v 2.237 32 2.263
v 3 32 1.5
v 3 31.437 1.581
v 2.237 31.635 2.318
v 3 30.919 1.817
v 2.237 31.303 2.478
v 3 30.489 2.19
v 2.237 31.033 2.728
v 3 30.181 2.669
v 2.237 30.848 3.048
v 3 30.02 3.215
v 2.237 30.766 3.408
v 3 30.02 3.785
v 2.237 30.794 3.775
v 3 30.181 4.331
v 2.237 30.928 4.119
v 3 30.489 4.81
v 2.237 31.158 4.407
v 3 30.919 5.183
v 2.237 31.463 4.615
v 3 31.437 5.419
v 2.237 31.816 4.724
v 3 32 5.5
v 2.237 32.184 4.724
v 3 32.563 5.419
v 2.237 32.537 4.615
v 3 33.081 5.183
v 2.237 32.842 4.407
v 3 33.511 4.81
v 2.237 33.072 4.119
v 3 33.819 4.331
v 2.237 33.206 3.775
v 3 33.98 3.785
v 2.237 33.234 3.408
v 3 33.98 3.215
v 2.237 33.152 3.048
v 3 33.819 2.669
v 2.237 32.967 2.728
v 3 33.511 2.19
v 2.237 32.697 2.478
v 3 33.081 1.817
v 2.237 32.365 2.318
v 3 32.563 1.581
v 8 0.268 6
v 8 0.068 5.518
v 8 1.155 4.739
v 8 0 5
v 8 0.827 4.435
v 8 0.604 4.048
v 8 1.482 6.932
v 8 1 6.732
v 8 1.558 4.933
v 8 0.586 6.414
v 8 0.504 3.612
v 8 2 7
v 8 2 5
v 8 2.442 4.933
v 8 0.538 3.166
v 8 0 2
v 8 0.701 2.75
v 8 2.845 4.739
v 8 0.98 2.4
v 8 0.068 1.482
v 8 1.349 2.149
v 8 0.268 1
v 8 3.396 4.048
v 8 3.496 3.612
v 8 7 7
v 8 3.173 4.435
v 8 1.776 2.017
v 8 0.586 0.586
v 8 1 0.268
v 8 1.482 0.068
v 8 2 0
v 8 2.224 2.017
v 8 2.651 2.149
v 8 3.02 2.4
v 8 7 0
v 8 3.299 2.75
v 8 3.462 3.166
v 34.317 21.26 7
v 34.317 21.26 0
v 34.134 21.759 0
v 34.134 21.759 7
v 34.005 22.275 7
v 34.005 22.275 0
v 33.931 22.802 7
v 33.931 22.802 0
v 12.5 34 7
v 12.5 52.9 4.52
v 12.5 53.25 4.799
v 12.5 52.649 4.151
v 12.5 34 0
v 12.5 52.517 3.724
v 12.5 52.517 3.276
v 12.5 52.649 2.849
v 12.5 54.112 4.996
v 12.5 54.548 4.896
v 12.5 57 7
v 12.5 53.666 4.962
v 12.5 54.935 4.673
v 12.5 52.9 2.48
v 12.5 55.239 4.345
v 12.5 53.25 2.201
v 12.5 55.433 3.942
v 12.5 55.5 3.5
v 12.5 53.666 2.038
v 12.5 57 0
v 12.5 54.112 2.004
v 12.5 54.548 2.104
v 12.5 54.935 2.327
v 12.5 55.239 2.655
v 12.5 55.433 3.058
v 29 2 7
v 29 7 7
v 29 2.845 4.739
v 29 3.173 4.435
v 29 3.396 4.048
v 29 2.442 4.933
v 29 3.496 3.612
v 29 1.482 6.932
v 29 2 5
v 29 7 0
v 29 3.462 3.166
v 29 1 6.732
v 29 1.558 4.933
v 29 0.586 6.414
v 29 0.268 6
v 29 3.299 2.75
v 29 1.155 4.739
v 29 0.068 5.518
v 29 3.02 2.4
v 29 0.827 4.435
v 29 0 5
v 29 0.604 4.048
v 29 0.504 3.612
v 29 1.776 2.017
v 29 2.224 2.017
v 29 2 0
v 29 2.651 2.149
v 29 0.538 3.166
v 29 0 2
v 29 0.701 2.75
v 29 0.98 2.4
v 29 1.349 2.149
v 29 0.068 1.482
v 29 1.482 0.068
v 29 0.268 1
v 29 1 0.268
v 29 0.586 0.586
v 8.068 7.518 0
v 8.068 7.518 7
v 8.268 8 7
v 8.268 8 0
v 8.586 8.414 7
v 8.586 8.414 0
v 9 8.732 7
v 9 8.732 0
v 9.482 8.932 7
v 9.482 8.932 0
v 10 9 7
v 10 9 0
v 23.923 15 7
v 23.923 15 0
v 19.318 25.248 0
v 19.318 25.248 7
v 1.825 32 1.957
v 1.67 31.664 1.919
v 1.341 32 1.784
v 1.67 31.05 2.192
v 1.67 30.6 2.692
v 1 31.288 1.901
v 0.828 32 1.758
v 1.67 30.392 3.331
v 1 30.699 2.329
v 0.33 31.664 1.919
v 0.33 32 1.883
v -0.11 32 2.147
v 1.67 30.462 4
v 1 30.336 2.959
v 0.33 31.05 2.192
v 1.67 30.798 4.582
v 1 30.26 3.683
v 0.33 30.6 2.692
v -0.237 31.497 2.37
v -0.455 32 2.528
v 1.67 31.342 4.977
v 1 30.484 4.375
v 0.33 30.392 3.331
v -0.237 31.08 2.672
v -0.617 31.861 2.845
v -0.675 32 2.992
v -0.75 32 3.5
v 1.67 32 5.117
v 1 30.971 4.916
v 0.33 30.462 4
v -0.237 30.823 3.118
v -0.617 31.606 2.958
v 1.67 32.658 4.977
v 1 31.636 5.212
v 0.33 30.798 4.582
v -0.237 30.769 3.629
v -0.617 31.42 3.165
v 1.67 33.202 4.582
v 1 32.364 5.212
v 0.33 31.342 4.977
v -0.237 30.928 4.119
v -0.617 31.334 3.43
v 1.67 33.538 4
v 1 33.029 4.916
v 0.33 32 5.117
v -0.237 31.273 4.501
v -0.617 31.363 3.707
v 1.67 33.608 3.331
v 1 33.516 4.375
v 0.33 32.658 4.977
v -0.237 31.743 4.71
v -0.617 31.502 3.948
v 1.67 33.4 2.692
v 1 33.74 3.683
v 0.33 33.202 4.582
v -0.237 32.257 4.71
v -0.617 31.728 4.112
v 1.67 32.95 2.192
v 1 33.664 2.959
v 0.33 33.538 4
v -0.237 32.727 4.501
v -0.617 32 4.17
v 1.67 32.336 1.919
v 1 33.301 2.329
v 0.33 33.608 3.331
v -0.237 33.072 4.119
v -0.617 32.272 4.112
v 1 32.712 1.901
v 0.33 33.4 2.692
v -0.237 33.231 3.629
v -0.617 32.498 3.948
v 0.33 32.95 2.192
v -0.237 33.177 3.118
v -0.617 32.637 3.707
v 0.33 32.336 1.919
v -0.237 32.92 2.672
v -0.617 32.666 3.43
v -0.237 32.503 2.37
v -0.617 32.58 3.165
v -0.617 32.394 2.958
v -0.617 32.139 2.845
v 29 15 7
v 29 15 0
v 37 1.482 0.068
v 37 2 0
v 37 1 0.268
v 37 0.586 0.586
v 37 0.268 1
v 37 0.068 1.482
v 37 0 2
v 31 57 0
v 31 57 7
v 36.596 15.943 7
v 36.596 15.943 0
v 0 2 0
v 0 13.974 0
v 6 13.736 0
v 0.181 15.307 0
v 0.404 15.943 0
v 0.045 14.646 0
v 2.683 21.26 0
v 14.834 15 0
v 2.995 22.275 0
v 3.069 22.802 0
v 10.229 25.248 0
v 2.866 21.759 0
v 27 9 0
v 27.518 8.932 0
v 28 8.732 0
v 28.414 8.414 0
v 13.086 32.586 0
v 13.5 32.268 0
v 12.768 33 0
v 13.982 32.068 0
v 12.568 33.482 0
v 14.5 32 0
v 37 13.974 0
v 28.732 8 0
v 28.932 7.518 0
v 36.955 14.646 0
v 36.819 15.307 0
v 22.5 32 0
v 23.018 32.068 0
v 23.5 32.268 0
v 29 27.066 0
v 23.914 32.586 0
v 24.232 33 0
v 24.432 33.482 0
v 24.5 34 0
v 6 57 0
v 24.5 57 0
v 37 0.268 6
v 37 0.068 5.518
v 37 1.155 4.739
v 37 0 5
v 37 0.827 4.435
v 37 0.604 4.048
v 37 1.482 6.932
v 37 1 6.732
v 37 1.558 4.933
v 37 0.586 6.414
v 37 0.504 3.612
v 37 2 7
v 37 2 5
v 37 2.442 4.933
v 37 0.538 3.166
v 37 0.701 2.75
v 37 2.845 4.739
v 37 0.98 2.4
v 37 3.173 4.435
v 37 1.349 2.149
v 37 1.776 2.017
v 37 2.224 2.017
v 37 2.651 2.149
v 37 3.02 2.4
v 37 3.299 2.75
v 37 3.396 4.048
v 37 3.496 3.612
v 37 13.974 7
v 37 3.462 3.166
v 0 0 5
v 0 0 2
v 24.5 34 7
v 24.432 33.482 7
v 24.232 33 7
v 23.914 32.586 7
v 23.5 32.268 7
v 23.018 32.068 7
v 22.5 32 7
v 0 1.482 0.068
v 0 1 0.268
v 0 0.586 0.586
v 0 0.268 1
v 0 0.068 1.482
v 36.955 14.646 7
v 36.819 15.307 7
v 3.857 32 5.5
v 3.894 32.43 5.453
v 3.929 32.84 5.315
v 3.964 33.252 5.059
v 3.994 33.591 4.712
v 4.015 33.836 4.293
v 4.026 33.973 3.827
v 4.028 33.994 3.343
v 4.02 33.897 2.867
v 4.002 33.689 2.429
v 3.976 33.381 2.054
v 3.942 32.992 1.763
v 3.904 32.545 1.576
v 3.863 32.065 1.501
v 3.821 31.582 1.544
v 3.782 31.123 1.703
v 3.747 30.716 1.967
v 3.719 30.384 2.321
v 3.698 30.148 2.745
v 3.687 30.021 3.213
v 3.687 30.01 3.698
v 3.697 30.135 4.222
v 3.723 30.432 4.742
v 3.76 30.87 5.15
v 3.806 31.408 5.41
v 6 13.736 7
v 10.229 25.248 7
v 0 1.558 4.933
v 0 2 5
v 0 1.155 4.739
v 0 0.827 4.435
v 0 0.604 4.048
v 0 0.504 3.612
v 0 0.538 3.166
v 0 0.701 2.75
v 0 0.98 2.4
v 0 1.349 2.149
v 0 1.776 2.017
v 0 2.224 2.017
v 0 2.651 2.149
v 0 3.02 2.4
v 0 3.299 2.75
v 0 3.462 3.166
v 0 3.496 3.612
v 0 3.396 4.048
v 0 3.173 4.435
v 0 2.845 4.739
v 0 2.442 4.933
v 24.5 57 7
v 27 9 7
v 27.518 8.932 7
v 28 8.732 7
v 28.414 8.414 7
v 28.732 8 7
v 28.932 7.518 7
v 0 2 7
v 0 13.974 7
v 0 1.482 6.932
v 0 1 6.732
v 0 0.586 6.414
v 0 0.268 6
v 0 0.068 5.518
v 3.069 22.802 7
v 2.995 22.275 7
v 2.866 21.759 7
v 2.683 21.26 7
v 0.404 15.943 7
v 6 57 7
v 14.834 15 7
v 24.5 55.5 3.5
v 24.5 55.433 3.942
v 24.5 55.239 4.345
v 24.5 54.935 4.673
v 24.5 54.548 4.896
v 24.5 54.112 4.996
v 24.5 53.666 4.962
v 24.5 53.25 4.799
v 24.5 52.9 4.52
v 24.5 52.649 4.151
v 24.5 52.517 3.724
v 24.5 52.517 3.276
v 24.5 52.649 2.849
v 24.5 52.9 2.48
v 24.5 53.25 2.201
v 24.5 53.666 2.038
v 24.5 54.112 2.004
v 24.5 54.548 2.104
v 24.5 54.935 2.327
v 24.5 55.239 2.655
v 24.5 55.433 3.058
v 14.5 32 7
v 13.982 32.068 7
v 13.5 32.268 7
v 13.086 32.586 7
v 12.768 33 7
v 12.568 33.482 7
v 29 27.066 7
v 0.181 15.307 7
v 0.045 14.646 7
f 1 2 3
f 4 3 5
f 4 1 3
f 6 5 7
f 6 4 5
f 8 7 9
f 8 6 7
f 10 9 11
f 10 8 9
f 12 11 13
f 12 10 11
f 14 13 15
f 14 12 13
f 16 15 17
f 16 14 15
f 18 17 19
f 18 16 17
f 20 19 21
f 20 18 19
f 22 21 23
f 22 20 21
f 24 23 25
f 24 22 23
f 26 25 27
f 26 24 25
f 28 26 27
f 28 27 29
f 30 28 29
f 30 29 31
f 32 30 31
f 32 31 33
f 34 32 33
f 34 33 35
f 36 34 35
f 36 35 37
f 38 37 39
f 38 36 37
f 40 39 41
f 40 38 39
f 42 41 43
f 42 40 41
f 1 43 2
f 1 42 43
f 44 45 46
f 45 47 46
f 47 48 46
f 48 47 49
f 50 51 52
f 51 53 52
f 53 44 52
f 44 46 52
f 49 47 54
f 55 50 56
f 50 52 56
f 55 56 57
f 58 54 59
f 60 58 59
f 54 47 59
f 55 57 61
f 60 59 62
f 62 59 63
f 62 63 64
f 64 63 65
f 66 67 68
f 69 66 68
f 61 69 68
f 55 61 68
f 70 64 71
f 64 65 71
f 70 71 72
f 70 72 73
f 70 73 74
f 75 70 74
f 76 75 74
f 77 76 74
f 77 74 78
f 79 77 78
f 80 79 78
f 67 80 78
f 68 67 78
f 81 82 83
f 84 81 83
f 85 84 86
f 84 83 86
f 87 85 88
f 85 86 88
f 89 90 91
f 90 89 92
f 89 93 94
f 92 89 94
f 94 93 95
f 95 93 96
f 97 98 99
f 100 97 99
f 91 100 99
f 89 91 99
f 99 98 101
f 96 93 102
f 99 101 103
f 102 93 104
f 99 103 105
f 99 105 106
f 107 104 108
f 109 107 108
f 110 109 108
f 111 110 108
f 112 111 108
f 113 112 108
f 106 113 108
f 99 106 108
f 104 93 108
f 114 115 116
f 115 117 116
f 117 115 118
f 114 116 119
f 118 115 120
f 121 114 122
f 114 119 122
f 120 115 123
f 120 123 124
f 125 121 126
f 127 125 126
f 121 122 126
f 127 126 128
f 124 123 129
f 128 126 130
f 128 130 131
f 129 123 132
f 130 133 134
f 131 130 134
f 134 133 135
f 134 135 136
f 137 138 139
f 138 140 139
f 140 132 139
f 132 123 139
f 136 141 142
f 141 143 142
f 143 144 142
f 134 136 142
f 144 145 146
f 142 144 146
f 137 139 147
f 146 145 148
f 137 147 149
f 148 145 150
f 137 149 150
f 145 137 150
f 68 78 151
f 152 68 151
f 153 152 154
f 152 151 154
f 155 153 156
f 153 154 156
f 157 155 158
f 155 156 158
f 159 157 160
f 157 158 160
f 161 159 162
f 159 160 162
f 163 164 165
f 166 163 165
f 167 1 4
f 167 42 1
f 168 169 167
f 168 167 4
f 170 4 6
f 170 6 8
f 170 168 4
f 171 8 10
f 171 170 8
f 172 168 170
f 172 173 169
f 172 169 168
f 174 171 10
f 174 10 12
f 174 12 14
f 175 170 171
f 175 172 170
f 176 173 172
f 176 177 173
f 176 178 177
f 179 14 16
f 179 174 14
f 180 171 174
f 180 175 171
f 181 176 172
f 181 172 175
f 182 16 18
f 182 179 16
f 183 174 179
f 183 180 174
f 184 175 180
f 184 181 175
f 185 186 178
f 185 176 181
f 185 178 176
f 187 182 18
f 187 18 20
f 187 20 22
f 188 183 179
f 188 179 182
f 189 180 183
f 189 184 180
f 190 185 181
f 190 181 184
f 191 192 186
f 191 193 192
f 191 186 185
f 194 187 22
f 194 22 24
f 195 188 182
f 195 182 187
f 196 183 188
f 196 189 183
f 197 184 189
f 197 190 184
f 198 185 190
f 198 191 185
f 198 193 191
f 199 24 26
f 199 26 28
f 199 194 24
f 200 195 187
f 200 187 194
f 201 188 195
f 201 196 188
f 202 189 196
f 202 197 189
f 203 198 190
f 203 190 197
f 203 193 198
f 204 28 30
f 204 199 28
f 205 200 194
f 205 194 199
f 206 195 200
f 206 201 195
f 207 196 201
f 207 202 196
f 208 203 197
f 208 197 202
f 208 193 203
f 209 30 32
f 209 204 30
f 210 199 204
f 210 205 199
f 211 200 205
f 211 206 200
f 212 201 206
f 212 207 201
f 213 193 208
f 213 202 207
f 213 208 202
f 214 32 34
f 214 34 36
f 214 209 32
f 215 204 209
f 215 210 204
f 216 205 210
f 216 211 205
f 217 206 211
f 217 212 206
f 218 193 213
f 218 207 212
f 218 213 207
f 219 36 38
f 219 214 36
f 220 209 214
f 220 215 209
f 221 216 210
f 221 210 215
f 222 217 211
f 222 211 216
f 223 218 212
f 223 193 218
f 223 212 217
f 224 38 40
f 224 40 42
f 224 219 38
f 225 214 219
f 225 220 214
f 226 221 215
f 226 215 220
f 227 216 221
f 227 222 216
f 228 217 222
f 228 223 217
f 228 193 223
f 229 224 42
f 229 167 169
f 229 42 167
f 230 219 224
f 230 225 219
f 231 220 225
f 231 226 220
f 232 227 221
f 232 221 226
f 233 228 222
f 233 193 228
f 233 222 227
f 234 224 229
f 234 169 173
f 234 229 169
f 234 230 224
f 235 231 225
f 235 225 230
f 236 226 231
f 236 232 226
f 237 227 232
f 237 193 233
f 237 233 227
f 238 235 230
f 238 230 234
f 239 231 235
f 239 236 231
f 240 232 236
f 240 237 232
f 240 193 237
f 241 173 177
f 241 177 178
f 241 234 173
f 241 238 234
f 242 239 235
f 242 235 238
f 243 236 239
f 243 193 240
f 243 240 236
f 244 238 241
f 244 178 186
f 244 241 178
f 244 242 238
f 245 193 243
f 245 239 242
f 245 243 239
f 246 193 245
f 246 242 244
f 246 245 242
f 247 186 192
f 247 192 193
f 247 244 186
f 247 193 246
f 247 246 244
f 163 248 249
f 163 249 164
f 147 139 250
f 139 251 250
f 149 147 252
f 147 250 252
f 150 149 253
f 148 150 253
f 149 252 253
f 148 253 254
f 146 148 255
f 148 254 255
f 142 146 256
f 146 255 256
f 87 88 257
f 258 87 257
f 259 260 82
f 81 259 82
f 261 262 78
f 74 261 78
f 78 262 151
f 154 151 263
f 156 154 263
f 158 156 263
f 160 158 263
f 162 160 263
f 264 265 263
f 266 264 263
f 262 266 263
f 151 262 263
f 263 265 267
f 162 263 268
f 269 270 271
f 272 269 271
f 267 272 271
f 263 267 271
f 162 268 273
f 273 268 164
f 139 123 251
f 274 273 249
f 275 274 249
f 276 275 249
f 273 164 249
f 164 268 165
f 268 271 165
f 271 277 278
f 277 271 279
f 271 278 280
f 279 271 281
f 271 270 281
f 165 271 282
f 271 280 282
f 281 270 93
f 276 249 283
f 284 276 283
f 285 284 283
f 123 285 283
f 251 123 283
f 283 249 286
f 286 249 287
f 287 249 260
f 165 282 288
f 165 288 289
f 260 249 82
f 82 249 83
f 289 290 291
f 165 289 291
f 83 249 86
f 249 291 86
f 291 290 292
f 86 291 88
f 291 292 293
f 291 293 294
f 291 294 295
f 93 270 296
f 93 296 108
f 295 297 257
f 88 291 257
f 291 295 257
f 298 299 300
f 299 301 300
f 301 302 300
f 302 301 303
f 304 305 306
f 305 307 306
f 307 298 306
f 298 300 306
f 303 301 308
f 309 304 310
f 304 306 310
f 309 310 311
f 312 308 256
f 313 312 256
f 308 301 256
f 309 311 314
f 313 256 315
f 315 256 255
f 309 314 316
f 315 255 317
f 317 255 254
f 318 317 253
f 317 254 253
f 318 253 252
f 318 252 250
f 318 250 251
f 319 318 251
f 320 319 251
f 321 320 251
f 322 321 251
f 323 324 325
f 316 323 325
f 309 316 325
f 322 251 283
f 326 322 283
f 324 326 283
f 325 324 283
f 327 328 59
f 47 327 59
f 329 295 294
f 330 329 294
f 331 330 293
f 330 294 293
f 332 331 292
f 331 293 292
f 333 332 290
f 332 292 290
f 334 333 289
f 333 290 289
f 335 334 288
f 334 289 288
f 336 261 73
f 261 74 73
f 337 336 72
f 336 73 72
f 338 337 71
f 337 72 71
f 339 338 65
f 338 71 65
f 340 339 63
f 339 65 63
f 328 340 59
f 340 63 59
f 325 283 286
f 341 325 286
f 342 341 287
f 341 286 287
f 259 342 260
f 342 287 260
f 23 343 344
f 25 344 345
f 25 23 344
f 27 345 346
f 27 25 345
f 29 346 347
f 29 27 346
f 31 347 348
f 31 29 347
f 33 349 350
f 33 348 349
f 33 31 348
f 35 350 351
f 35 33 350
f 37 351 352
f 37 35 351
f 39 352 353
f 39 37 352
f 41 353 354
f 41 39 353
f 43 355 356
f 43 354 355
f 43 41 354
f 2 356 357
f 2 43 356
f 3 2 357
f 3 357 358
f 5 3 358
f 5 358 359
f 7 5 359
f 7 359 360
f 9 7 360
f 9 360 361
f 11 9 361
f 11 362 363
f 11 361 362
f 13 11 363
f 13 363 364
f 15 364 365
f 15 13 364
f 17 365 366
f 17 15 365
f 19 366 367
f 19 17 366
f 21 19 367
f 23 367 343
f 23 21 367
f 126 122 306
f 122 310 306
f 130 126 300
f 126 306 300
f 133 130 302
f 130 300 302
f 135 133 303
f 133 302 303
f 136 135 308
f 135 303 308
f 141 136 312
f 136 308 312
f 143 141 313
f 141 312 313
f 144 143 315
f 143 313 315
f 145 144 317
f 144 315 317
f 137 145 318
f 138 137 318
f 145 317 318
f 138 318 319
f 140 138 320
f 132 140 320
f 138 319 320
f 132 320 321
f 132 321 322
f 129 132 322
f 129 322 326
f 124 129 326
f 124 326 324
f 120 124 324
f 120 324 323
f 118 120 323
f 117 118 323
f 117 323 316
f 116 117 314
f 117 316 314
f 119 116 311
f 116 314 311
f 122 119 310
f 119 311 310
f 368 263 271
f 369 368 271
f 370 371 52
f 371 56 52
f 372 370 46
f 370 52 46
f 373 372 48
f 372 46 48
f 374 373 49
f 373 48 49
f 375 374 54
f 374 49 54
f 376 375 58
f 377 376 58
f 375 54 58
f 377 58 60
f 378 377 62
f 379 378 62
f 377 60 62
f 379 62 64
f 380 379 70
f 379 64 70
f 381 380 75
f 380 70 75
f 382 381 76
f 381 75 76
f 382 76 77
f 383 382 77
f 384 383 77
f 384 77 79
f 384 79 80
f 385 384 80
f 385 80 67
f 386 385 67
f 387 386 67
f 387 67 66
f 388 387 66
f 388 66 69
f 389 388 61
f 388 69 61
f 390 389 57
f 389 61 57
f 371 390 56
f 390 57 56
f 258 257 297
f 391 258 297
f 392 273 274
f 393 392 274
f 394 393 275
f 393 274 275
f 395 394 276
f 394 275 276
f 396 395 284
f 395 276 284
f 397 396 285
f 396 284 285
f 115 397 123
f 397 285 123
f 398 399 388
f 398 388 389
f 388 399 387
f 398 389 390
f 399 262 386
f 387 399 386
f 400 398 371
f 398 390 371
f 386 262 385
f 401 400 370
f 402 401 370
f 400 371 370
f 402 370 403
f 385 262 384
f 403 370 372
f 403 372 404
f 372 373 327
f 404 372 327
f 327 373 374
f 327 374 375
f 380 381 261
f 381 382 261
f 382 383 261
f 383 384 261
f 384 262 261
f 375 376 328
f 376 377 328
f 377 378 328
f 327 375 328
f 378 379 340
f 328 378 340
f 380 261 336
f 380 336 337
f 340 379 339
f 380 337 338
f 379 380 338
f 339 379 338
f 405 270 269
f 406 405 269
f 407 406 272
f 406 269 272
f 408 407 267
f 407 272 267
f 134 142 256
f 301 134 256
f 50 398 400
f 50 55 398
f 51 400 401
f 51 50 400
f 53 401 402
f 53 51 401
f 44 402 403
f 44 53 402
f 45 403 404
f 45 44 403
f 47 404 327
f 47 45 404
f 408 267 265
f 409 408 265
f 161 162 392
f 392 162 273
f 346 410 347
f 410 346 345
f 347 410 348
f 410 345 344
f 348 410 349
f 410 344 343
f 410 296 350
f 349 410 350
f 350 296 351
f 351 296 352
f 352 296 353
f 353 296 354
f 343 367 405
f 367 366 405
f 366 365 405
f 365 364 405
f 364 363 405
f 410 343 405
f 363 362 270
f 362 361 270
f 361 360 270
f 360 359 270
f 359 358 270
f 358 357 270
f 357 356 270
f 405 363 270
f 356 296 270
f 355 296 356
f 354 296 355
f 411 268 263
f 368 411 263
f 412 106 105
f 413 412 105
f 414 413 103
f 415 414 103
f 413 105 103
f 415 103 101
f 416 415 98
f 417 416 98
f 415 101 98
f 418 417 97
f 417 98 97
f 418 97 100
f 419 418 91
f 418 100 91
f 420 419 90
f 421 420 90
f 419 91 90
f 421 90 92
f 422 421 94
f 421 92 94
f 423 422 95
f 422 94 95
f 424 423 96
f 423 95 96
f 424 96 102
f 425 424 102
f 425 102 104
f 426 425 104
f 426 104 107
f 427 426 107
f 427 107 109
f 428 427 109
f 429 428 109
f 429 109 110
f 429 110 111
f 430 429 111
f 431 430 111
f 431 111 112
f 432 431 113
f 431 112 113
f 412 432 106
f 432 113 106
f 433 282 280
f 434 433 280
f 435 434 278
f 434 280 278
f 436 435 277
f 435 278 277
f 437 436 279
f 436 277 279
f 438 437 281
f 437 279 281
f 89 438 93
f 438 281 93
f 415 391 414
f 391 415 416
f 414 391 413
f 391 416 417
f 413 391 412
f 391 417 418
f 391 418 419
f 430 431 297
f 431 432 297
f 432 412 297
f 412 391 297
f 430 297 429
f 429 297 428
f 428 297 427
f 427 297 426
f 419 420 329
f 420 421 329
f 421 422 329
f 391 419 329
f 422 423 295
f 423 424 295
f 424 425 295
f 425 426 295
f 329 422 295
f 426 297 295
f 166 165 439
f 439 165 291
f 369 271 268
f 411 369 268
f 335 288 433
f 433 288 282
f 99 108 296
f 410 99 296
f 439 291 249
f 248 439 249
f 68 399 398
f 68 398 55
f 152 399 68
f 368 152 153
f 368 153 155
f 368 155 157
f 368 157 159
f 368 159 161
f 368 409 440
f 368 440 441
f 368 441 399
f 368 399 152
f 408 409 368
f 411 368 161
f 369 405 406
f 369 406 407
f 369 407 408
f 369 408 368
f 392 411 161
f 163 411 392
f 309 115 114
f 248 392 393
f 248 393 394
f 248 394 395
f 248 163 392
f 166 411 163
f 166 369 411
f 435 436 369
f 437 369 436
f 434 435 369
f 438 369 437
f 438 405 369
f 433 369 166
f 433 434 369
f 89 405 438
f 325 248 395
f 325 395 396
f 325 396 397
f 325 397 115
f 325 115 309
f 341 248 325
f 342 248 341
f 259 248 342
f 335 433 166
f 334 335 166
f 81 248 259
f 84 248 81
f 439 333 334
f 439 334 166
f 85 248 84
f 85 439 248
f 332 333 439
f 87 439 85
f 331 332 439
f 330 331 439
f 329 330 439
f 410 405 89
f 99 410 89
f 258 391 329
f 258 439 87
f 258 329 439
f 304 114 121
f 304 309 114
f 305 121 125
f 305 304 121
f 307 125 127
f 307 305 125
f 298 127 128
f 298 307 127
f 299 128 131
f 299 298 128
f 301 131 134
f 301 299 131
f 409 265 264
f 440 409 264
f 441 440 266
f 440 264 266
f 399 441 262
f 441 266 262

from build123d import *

# Parameters (mm, degrees)
EXTRUDE_1_DEPTH     = 7
SKETCH_2_R          = 1.5
CUT_EXTRUDE_1_DEPTH = 50
SKETCH_5_R          = 2
EXTRUDE_2_DEPTH     = 2
FILLET_2_R          = 2
SKETCH_3_R          = 1.5
EXTRUDE_3_DEPTH     = 12


with BuildPart() as part:
    # 草图1 → 凸台-拉伸1 (new body)
    with BuildSketch(Plane.XY):
        with BuildLine():
            Line((0, 13.97371149), (0, 0))
            Line((0, 0), (8, 0))
            Line((8, 0), (8, 7))
            ThreePointArc((8, 7), (8.585786438, 8.414213562), (10, 9))
            Line((10, 9), (27, 9))
            ThreePointArc((27, 9), (28.414213562, 8.414213562), (29, 7))
            Line((29, 7), (29, 0))
            Line((29, 0), (37, 0))
            Line((37, 0), (37, 13.97371149))
            ThreePointArc((37, 13.97371149), (36.897888614, 14.979040852), (36.59572515, 15.943307983))
            Line((36.59572515, 15.943307983), (34.317232535, 21.259790752))
            ThreePointArc((34.317232535, 21.259790752), (34.062511941, 22.01564259), (33.93122444, 22.802381539))
            Line((33.93122444, 22.802381539), (31, 57))
            Line((31, 57), (24.5, 57))
            Line((24.5, 57), (24.5, 34))
            ThreePointArc((24.5, 34), (23.914213562, 32.585786438), (22.5, 32))
            Line((22.5, 32), (18.5, 32))
            Line((18.5, 32), (14.5, 32))
            ThreePointArc((14.5, 32), (13.085786438, 32.585786438), (12.5, 34))
            Line((12.5, 34), (12.5, 57))
            Line((12.5, 57), (6, 57))
            Line((6, 57), (3.06877556, 22.802381539))
            ThreePointArc((3.06877556, 22.802381539), (2.937488059, 22.01564259), (2.682767465, 21.259790752))
            Line((2.682767465, 21.259790752), (0.40427485, 15.943307983))
            ThreePointArc((0.40427485, 15.943307983), (0.102111386, 14.979040852), (0, 13.97371149))
        make_face()
        Polygon((6, 13.736227722), (10.229385492, 25.248189223), (14.834170093, 15), align=None, mode=Mode.SUBTRACT)
        Polygon((23.922560752, 15), (19.317776151, 25.248189223), (29, 27.065867355), (29, 15), align=None, mode=Mode.SUBTRACT)
    extrude(amount=EXTRUDE_1_DEPTH)

    # 草图2 → 切除-拉伸1 (cut, symmetric)
    with BuildSketch(Plane(origin=(8, 0, 0), x_dir=(0, 0, -1), z_dir=(1, 0, 0))):
        with Locations(Location((-3.5, 2, 0), (0, 0, 180))):
            Circle(SKETCH_2_R)
    extrude(amount=CUT_EXTRUDE_1_DEPTH, both=True, mode=Mode.SUBTRACT)

    # 草图5 → 凸台-拉伸2 (add)
    with BuildSketch(Plane.ZY.offset(-3)):
        with Locations((3.5, 32)):
            Circle(SKETCH_5_R)
    extrude(amount=-EXTRUDE_2_DEPTH)

    # 草图6 → 旋转1 (revolve)
    with BuildSketch(Plane(origin=(0, 0, 3.5), x_dir=(-1, 0, 0), z_dir=(0, 0, -1)), mode=Mode.PRIVATE) as revolve_1_sk:
        with BuildLine():
            Line((-3, 32), (-3, 30))
            Line((-3, 30), (-2.237436867, 30.762563133))
            ThreePointArc((-2.237436867, 30.762563133), (-0.330303993, 30.383210818), (0.75, 32))
            Line((0.75, 32), (-1, 32))
            Line((-1, 32), (-3, 32))
        make_face()
    revolve(revolve_1_sk.sketch.rotate(Axis((3, 32, 3.5), (-1, 0, 0)), 270), axis=Axis((3, 32, 3.5), (-1, 0, 0)))

    # 圆角2
    fillet_2_edges = [part.edges().sort_by_distance(p)[0] for p in [
        (33, 0, 0),
        (4, 0, 0),
        (4, 0, 7),
        (33, 0, 7),
    ]]
    fillet(fillet_2_edges, radius=FILLET_2_R)

    # 草图3 → 凸台-拉伸3 (add)
    with BuildSketch(Plane(origin=(12.5, 0, 0), x_dir=(0, 0, -1), z_dir=(1, 0, 0))):
        with Locations(Location((-3.5, 54, 0), (0, 0, 90))):
            Circle(SKETCH_3_R)
    extrude(amount=EXTRUDE_3_DEPTH)


solid = part.part
